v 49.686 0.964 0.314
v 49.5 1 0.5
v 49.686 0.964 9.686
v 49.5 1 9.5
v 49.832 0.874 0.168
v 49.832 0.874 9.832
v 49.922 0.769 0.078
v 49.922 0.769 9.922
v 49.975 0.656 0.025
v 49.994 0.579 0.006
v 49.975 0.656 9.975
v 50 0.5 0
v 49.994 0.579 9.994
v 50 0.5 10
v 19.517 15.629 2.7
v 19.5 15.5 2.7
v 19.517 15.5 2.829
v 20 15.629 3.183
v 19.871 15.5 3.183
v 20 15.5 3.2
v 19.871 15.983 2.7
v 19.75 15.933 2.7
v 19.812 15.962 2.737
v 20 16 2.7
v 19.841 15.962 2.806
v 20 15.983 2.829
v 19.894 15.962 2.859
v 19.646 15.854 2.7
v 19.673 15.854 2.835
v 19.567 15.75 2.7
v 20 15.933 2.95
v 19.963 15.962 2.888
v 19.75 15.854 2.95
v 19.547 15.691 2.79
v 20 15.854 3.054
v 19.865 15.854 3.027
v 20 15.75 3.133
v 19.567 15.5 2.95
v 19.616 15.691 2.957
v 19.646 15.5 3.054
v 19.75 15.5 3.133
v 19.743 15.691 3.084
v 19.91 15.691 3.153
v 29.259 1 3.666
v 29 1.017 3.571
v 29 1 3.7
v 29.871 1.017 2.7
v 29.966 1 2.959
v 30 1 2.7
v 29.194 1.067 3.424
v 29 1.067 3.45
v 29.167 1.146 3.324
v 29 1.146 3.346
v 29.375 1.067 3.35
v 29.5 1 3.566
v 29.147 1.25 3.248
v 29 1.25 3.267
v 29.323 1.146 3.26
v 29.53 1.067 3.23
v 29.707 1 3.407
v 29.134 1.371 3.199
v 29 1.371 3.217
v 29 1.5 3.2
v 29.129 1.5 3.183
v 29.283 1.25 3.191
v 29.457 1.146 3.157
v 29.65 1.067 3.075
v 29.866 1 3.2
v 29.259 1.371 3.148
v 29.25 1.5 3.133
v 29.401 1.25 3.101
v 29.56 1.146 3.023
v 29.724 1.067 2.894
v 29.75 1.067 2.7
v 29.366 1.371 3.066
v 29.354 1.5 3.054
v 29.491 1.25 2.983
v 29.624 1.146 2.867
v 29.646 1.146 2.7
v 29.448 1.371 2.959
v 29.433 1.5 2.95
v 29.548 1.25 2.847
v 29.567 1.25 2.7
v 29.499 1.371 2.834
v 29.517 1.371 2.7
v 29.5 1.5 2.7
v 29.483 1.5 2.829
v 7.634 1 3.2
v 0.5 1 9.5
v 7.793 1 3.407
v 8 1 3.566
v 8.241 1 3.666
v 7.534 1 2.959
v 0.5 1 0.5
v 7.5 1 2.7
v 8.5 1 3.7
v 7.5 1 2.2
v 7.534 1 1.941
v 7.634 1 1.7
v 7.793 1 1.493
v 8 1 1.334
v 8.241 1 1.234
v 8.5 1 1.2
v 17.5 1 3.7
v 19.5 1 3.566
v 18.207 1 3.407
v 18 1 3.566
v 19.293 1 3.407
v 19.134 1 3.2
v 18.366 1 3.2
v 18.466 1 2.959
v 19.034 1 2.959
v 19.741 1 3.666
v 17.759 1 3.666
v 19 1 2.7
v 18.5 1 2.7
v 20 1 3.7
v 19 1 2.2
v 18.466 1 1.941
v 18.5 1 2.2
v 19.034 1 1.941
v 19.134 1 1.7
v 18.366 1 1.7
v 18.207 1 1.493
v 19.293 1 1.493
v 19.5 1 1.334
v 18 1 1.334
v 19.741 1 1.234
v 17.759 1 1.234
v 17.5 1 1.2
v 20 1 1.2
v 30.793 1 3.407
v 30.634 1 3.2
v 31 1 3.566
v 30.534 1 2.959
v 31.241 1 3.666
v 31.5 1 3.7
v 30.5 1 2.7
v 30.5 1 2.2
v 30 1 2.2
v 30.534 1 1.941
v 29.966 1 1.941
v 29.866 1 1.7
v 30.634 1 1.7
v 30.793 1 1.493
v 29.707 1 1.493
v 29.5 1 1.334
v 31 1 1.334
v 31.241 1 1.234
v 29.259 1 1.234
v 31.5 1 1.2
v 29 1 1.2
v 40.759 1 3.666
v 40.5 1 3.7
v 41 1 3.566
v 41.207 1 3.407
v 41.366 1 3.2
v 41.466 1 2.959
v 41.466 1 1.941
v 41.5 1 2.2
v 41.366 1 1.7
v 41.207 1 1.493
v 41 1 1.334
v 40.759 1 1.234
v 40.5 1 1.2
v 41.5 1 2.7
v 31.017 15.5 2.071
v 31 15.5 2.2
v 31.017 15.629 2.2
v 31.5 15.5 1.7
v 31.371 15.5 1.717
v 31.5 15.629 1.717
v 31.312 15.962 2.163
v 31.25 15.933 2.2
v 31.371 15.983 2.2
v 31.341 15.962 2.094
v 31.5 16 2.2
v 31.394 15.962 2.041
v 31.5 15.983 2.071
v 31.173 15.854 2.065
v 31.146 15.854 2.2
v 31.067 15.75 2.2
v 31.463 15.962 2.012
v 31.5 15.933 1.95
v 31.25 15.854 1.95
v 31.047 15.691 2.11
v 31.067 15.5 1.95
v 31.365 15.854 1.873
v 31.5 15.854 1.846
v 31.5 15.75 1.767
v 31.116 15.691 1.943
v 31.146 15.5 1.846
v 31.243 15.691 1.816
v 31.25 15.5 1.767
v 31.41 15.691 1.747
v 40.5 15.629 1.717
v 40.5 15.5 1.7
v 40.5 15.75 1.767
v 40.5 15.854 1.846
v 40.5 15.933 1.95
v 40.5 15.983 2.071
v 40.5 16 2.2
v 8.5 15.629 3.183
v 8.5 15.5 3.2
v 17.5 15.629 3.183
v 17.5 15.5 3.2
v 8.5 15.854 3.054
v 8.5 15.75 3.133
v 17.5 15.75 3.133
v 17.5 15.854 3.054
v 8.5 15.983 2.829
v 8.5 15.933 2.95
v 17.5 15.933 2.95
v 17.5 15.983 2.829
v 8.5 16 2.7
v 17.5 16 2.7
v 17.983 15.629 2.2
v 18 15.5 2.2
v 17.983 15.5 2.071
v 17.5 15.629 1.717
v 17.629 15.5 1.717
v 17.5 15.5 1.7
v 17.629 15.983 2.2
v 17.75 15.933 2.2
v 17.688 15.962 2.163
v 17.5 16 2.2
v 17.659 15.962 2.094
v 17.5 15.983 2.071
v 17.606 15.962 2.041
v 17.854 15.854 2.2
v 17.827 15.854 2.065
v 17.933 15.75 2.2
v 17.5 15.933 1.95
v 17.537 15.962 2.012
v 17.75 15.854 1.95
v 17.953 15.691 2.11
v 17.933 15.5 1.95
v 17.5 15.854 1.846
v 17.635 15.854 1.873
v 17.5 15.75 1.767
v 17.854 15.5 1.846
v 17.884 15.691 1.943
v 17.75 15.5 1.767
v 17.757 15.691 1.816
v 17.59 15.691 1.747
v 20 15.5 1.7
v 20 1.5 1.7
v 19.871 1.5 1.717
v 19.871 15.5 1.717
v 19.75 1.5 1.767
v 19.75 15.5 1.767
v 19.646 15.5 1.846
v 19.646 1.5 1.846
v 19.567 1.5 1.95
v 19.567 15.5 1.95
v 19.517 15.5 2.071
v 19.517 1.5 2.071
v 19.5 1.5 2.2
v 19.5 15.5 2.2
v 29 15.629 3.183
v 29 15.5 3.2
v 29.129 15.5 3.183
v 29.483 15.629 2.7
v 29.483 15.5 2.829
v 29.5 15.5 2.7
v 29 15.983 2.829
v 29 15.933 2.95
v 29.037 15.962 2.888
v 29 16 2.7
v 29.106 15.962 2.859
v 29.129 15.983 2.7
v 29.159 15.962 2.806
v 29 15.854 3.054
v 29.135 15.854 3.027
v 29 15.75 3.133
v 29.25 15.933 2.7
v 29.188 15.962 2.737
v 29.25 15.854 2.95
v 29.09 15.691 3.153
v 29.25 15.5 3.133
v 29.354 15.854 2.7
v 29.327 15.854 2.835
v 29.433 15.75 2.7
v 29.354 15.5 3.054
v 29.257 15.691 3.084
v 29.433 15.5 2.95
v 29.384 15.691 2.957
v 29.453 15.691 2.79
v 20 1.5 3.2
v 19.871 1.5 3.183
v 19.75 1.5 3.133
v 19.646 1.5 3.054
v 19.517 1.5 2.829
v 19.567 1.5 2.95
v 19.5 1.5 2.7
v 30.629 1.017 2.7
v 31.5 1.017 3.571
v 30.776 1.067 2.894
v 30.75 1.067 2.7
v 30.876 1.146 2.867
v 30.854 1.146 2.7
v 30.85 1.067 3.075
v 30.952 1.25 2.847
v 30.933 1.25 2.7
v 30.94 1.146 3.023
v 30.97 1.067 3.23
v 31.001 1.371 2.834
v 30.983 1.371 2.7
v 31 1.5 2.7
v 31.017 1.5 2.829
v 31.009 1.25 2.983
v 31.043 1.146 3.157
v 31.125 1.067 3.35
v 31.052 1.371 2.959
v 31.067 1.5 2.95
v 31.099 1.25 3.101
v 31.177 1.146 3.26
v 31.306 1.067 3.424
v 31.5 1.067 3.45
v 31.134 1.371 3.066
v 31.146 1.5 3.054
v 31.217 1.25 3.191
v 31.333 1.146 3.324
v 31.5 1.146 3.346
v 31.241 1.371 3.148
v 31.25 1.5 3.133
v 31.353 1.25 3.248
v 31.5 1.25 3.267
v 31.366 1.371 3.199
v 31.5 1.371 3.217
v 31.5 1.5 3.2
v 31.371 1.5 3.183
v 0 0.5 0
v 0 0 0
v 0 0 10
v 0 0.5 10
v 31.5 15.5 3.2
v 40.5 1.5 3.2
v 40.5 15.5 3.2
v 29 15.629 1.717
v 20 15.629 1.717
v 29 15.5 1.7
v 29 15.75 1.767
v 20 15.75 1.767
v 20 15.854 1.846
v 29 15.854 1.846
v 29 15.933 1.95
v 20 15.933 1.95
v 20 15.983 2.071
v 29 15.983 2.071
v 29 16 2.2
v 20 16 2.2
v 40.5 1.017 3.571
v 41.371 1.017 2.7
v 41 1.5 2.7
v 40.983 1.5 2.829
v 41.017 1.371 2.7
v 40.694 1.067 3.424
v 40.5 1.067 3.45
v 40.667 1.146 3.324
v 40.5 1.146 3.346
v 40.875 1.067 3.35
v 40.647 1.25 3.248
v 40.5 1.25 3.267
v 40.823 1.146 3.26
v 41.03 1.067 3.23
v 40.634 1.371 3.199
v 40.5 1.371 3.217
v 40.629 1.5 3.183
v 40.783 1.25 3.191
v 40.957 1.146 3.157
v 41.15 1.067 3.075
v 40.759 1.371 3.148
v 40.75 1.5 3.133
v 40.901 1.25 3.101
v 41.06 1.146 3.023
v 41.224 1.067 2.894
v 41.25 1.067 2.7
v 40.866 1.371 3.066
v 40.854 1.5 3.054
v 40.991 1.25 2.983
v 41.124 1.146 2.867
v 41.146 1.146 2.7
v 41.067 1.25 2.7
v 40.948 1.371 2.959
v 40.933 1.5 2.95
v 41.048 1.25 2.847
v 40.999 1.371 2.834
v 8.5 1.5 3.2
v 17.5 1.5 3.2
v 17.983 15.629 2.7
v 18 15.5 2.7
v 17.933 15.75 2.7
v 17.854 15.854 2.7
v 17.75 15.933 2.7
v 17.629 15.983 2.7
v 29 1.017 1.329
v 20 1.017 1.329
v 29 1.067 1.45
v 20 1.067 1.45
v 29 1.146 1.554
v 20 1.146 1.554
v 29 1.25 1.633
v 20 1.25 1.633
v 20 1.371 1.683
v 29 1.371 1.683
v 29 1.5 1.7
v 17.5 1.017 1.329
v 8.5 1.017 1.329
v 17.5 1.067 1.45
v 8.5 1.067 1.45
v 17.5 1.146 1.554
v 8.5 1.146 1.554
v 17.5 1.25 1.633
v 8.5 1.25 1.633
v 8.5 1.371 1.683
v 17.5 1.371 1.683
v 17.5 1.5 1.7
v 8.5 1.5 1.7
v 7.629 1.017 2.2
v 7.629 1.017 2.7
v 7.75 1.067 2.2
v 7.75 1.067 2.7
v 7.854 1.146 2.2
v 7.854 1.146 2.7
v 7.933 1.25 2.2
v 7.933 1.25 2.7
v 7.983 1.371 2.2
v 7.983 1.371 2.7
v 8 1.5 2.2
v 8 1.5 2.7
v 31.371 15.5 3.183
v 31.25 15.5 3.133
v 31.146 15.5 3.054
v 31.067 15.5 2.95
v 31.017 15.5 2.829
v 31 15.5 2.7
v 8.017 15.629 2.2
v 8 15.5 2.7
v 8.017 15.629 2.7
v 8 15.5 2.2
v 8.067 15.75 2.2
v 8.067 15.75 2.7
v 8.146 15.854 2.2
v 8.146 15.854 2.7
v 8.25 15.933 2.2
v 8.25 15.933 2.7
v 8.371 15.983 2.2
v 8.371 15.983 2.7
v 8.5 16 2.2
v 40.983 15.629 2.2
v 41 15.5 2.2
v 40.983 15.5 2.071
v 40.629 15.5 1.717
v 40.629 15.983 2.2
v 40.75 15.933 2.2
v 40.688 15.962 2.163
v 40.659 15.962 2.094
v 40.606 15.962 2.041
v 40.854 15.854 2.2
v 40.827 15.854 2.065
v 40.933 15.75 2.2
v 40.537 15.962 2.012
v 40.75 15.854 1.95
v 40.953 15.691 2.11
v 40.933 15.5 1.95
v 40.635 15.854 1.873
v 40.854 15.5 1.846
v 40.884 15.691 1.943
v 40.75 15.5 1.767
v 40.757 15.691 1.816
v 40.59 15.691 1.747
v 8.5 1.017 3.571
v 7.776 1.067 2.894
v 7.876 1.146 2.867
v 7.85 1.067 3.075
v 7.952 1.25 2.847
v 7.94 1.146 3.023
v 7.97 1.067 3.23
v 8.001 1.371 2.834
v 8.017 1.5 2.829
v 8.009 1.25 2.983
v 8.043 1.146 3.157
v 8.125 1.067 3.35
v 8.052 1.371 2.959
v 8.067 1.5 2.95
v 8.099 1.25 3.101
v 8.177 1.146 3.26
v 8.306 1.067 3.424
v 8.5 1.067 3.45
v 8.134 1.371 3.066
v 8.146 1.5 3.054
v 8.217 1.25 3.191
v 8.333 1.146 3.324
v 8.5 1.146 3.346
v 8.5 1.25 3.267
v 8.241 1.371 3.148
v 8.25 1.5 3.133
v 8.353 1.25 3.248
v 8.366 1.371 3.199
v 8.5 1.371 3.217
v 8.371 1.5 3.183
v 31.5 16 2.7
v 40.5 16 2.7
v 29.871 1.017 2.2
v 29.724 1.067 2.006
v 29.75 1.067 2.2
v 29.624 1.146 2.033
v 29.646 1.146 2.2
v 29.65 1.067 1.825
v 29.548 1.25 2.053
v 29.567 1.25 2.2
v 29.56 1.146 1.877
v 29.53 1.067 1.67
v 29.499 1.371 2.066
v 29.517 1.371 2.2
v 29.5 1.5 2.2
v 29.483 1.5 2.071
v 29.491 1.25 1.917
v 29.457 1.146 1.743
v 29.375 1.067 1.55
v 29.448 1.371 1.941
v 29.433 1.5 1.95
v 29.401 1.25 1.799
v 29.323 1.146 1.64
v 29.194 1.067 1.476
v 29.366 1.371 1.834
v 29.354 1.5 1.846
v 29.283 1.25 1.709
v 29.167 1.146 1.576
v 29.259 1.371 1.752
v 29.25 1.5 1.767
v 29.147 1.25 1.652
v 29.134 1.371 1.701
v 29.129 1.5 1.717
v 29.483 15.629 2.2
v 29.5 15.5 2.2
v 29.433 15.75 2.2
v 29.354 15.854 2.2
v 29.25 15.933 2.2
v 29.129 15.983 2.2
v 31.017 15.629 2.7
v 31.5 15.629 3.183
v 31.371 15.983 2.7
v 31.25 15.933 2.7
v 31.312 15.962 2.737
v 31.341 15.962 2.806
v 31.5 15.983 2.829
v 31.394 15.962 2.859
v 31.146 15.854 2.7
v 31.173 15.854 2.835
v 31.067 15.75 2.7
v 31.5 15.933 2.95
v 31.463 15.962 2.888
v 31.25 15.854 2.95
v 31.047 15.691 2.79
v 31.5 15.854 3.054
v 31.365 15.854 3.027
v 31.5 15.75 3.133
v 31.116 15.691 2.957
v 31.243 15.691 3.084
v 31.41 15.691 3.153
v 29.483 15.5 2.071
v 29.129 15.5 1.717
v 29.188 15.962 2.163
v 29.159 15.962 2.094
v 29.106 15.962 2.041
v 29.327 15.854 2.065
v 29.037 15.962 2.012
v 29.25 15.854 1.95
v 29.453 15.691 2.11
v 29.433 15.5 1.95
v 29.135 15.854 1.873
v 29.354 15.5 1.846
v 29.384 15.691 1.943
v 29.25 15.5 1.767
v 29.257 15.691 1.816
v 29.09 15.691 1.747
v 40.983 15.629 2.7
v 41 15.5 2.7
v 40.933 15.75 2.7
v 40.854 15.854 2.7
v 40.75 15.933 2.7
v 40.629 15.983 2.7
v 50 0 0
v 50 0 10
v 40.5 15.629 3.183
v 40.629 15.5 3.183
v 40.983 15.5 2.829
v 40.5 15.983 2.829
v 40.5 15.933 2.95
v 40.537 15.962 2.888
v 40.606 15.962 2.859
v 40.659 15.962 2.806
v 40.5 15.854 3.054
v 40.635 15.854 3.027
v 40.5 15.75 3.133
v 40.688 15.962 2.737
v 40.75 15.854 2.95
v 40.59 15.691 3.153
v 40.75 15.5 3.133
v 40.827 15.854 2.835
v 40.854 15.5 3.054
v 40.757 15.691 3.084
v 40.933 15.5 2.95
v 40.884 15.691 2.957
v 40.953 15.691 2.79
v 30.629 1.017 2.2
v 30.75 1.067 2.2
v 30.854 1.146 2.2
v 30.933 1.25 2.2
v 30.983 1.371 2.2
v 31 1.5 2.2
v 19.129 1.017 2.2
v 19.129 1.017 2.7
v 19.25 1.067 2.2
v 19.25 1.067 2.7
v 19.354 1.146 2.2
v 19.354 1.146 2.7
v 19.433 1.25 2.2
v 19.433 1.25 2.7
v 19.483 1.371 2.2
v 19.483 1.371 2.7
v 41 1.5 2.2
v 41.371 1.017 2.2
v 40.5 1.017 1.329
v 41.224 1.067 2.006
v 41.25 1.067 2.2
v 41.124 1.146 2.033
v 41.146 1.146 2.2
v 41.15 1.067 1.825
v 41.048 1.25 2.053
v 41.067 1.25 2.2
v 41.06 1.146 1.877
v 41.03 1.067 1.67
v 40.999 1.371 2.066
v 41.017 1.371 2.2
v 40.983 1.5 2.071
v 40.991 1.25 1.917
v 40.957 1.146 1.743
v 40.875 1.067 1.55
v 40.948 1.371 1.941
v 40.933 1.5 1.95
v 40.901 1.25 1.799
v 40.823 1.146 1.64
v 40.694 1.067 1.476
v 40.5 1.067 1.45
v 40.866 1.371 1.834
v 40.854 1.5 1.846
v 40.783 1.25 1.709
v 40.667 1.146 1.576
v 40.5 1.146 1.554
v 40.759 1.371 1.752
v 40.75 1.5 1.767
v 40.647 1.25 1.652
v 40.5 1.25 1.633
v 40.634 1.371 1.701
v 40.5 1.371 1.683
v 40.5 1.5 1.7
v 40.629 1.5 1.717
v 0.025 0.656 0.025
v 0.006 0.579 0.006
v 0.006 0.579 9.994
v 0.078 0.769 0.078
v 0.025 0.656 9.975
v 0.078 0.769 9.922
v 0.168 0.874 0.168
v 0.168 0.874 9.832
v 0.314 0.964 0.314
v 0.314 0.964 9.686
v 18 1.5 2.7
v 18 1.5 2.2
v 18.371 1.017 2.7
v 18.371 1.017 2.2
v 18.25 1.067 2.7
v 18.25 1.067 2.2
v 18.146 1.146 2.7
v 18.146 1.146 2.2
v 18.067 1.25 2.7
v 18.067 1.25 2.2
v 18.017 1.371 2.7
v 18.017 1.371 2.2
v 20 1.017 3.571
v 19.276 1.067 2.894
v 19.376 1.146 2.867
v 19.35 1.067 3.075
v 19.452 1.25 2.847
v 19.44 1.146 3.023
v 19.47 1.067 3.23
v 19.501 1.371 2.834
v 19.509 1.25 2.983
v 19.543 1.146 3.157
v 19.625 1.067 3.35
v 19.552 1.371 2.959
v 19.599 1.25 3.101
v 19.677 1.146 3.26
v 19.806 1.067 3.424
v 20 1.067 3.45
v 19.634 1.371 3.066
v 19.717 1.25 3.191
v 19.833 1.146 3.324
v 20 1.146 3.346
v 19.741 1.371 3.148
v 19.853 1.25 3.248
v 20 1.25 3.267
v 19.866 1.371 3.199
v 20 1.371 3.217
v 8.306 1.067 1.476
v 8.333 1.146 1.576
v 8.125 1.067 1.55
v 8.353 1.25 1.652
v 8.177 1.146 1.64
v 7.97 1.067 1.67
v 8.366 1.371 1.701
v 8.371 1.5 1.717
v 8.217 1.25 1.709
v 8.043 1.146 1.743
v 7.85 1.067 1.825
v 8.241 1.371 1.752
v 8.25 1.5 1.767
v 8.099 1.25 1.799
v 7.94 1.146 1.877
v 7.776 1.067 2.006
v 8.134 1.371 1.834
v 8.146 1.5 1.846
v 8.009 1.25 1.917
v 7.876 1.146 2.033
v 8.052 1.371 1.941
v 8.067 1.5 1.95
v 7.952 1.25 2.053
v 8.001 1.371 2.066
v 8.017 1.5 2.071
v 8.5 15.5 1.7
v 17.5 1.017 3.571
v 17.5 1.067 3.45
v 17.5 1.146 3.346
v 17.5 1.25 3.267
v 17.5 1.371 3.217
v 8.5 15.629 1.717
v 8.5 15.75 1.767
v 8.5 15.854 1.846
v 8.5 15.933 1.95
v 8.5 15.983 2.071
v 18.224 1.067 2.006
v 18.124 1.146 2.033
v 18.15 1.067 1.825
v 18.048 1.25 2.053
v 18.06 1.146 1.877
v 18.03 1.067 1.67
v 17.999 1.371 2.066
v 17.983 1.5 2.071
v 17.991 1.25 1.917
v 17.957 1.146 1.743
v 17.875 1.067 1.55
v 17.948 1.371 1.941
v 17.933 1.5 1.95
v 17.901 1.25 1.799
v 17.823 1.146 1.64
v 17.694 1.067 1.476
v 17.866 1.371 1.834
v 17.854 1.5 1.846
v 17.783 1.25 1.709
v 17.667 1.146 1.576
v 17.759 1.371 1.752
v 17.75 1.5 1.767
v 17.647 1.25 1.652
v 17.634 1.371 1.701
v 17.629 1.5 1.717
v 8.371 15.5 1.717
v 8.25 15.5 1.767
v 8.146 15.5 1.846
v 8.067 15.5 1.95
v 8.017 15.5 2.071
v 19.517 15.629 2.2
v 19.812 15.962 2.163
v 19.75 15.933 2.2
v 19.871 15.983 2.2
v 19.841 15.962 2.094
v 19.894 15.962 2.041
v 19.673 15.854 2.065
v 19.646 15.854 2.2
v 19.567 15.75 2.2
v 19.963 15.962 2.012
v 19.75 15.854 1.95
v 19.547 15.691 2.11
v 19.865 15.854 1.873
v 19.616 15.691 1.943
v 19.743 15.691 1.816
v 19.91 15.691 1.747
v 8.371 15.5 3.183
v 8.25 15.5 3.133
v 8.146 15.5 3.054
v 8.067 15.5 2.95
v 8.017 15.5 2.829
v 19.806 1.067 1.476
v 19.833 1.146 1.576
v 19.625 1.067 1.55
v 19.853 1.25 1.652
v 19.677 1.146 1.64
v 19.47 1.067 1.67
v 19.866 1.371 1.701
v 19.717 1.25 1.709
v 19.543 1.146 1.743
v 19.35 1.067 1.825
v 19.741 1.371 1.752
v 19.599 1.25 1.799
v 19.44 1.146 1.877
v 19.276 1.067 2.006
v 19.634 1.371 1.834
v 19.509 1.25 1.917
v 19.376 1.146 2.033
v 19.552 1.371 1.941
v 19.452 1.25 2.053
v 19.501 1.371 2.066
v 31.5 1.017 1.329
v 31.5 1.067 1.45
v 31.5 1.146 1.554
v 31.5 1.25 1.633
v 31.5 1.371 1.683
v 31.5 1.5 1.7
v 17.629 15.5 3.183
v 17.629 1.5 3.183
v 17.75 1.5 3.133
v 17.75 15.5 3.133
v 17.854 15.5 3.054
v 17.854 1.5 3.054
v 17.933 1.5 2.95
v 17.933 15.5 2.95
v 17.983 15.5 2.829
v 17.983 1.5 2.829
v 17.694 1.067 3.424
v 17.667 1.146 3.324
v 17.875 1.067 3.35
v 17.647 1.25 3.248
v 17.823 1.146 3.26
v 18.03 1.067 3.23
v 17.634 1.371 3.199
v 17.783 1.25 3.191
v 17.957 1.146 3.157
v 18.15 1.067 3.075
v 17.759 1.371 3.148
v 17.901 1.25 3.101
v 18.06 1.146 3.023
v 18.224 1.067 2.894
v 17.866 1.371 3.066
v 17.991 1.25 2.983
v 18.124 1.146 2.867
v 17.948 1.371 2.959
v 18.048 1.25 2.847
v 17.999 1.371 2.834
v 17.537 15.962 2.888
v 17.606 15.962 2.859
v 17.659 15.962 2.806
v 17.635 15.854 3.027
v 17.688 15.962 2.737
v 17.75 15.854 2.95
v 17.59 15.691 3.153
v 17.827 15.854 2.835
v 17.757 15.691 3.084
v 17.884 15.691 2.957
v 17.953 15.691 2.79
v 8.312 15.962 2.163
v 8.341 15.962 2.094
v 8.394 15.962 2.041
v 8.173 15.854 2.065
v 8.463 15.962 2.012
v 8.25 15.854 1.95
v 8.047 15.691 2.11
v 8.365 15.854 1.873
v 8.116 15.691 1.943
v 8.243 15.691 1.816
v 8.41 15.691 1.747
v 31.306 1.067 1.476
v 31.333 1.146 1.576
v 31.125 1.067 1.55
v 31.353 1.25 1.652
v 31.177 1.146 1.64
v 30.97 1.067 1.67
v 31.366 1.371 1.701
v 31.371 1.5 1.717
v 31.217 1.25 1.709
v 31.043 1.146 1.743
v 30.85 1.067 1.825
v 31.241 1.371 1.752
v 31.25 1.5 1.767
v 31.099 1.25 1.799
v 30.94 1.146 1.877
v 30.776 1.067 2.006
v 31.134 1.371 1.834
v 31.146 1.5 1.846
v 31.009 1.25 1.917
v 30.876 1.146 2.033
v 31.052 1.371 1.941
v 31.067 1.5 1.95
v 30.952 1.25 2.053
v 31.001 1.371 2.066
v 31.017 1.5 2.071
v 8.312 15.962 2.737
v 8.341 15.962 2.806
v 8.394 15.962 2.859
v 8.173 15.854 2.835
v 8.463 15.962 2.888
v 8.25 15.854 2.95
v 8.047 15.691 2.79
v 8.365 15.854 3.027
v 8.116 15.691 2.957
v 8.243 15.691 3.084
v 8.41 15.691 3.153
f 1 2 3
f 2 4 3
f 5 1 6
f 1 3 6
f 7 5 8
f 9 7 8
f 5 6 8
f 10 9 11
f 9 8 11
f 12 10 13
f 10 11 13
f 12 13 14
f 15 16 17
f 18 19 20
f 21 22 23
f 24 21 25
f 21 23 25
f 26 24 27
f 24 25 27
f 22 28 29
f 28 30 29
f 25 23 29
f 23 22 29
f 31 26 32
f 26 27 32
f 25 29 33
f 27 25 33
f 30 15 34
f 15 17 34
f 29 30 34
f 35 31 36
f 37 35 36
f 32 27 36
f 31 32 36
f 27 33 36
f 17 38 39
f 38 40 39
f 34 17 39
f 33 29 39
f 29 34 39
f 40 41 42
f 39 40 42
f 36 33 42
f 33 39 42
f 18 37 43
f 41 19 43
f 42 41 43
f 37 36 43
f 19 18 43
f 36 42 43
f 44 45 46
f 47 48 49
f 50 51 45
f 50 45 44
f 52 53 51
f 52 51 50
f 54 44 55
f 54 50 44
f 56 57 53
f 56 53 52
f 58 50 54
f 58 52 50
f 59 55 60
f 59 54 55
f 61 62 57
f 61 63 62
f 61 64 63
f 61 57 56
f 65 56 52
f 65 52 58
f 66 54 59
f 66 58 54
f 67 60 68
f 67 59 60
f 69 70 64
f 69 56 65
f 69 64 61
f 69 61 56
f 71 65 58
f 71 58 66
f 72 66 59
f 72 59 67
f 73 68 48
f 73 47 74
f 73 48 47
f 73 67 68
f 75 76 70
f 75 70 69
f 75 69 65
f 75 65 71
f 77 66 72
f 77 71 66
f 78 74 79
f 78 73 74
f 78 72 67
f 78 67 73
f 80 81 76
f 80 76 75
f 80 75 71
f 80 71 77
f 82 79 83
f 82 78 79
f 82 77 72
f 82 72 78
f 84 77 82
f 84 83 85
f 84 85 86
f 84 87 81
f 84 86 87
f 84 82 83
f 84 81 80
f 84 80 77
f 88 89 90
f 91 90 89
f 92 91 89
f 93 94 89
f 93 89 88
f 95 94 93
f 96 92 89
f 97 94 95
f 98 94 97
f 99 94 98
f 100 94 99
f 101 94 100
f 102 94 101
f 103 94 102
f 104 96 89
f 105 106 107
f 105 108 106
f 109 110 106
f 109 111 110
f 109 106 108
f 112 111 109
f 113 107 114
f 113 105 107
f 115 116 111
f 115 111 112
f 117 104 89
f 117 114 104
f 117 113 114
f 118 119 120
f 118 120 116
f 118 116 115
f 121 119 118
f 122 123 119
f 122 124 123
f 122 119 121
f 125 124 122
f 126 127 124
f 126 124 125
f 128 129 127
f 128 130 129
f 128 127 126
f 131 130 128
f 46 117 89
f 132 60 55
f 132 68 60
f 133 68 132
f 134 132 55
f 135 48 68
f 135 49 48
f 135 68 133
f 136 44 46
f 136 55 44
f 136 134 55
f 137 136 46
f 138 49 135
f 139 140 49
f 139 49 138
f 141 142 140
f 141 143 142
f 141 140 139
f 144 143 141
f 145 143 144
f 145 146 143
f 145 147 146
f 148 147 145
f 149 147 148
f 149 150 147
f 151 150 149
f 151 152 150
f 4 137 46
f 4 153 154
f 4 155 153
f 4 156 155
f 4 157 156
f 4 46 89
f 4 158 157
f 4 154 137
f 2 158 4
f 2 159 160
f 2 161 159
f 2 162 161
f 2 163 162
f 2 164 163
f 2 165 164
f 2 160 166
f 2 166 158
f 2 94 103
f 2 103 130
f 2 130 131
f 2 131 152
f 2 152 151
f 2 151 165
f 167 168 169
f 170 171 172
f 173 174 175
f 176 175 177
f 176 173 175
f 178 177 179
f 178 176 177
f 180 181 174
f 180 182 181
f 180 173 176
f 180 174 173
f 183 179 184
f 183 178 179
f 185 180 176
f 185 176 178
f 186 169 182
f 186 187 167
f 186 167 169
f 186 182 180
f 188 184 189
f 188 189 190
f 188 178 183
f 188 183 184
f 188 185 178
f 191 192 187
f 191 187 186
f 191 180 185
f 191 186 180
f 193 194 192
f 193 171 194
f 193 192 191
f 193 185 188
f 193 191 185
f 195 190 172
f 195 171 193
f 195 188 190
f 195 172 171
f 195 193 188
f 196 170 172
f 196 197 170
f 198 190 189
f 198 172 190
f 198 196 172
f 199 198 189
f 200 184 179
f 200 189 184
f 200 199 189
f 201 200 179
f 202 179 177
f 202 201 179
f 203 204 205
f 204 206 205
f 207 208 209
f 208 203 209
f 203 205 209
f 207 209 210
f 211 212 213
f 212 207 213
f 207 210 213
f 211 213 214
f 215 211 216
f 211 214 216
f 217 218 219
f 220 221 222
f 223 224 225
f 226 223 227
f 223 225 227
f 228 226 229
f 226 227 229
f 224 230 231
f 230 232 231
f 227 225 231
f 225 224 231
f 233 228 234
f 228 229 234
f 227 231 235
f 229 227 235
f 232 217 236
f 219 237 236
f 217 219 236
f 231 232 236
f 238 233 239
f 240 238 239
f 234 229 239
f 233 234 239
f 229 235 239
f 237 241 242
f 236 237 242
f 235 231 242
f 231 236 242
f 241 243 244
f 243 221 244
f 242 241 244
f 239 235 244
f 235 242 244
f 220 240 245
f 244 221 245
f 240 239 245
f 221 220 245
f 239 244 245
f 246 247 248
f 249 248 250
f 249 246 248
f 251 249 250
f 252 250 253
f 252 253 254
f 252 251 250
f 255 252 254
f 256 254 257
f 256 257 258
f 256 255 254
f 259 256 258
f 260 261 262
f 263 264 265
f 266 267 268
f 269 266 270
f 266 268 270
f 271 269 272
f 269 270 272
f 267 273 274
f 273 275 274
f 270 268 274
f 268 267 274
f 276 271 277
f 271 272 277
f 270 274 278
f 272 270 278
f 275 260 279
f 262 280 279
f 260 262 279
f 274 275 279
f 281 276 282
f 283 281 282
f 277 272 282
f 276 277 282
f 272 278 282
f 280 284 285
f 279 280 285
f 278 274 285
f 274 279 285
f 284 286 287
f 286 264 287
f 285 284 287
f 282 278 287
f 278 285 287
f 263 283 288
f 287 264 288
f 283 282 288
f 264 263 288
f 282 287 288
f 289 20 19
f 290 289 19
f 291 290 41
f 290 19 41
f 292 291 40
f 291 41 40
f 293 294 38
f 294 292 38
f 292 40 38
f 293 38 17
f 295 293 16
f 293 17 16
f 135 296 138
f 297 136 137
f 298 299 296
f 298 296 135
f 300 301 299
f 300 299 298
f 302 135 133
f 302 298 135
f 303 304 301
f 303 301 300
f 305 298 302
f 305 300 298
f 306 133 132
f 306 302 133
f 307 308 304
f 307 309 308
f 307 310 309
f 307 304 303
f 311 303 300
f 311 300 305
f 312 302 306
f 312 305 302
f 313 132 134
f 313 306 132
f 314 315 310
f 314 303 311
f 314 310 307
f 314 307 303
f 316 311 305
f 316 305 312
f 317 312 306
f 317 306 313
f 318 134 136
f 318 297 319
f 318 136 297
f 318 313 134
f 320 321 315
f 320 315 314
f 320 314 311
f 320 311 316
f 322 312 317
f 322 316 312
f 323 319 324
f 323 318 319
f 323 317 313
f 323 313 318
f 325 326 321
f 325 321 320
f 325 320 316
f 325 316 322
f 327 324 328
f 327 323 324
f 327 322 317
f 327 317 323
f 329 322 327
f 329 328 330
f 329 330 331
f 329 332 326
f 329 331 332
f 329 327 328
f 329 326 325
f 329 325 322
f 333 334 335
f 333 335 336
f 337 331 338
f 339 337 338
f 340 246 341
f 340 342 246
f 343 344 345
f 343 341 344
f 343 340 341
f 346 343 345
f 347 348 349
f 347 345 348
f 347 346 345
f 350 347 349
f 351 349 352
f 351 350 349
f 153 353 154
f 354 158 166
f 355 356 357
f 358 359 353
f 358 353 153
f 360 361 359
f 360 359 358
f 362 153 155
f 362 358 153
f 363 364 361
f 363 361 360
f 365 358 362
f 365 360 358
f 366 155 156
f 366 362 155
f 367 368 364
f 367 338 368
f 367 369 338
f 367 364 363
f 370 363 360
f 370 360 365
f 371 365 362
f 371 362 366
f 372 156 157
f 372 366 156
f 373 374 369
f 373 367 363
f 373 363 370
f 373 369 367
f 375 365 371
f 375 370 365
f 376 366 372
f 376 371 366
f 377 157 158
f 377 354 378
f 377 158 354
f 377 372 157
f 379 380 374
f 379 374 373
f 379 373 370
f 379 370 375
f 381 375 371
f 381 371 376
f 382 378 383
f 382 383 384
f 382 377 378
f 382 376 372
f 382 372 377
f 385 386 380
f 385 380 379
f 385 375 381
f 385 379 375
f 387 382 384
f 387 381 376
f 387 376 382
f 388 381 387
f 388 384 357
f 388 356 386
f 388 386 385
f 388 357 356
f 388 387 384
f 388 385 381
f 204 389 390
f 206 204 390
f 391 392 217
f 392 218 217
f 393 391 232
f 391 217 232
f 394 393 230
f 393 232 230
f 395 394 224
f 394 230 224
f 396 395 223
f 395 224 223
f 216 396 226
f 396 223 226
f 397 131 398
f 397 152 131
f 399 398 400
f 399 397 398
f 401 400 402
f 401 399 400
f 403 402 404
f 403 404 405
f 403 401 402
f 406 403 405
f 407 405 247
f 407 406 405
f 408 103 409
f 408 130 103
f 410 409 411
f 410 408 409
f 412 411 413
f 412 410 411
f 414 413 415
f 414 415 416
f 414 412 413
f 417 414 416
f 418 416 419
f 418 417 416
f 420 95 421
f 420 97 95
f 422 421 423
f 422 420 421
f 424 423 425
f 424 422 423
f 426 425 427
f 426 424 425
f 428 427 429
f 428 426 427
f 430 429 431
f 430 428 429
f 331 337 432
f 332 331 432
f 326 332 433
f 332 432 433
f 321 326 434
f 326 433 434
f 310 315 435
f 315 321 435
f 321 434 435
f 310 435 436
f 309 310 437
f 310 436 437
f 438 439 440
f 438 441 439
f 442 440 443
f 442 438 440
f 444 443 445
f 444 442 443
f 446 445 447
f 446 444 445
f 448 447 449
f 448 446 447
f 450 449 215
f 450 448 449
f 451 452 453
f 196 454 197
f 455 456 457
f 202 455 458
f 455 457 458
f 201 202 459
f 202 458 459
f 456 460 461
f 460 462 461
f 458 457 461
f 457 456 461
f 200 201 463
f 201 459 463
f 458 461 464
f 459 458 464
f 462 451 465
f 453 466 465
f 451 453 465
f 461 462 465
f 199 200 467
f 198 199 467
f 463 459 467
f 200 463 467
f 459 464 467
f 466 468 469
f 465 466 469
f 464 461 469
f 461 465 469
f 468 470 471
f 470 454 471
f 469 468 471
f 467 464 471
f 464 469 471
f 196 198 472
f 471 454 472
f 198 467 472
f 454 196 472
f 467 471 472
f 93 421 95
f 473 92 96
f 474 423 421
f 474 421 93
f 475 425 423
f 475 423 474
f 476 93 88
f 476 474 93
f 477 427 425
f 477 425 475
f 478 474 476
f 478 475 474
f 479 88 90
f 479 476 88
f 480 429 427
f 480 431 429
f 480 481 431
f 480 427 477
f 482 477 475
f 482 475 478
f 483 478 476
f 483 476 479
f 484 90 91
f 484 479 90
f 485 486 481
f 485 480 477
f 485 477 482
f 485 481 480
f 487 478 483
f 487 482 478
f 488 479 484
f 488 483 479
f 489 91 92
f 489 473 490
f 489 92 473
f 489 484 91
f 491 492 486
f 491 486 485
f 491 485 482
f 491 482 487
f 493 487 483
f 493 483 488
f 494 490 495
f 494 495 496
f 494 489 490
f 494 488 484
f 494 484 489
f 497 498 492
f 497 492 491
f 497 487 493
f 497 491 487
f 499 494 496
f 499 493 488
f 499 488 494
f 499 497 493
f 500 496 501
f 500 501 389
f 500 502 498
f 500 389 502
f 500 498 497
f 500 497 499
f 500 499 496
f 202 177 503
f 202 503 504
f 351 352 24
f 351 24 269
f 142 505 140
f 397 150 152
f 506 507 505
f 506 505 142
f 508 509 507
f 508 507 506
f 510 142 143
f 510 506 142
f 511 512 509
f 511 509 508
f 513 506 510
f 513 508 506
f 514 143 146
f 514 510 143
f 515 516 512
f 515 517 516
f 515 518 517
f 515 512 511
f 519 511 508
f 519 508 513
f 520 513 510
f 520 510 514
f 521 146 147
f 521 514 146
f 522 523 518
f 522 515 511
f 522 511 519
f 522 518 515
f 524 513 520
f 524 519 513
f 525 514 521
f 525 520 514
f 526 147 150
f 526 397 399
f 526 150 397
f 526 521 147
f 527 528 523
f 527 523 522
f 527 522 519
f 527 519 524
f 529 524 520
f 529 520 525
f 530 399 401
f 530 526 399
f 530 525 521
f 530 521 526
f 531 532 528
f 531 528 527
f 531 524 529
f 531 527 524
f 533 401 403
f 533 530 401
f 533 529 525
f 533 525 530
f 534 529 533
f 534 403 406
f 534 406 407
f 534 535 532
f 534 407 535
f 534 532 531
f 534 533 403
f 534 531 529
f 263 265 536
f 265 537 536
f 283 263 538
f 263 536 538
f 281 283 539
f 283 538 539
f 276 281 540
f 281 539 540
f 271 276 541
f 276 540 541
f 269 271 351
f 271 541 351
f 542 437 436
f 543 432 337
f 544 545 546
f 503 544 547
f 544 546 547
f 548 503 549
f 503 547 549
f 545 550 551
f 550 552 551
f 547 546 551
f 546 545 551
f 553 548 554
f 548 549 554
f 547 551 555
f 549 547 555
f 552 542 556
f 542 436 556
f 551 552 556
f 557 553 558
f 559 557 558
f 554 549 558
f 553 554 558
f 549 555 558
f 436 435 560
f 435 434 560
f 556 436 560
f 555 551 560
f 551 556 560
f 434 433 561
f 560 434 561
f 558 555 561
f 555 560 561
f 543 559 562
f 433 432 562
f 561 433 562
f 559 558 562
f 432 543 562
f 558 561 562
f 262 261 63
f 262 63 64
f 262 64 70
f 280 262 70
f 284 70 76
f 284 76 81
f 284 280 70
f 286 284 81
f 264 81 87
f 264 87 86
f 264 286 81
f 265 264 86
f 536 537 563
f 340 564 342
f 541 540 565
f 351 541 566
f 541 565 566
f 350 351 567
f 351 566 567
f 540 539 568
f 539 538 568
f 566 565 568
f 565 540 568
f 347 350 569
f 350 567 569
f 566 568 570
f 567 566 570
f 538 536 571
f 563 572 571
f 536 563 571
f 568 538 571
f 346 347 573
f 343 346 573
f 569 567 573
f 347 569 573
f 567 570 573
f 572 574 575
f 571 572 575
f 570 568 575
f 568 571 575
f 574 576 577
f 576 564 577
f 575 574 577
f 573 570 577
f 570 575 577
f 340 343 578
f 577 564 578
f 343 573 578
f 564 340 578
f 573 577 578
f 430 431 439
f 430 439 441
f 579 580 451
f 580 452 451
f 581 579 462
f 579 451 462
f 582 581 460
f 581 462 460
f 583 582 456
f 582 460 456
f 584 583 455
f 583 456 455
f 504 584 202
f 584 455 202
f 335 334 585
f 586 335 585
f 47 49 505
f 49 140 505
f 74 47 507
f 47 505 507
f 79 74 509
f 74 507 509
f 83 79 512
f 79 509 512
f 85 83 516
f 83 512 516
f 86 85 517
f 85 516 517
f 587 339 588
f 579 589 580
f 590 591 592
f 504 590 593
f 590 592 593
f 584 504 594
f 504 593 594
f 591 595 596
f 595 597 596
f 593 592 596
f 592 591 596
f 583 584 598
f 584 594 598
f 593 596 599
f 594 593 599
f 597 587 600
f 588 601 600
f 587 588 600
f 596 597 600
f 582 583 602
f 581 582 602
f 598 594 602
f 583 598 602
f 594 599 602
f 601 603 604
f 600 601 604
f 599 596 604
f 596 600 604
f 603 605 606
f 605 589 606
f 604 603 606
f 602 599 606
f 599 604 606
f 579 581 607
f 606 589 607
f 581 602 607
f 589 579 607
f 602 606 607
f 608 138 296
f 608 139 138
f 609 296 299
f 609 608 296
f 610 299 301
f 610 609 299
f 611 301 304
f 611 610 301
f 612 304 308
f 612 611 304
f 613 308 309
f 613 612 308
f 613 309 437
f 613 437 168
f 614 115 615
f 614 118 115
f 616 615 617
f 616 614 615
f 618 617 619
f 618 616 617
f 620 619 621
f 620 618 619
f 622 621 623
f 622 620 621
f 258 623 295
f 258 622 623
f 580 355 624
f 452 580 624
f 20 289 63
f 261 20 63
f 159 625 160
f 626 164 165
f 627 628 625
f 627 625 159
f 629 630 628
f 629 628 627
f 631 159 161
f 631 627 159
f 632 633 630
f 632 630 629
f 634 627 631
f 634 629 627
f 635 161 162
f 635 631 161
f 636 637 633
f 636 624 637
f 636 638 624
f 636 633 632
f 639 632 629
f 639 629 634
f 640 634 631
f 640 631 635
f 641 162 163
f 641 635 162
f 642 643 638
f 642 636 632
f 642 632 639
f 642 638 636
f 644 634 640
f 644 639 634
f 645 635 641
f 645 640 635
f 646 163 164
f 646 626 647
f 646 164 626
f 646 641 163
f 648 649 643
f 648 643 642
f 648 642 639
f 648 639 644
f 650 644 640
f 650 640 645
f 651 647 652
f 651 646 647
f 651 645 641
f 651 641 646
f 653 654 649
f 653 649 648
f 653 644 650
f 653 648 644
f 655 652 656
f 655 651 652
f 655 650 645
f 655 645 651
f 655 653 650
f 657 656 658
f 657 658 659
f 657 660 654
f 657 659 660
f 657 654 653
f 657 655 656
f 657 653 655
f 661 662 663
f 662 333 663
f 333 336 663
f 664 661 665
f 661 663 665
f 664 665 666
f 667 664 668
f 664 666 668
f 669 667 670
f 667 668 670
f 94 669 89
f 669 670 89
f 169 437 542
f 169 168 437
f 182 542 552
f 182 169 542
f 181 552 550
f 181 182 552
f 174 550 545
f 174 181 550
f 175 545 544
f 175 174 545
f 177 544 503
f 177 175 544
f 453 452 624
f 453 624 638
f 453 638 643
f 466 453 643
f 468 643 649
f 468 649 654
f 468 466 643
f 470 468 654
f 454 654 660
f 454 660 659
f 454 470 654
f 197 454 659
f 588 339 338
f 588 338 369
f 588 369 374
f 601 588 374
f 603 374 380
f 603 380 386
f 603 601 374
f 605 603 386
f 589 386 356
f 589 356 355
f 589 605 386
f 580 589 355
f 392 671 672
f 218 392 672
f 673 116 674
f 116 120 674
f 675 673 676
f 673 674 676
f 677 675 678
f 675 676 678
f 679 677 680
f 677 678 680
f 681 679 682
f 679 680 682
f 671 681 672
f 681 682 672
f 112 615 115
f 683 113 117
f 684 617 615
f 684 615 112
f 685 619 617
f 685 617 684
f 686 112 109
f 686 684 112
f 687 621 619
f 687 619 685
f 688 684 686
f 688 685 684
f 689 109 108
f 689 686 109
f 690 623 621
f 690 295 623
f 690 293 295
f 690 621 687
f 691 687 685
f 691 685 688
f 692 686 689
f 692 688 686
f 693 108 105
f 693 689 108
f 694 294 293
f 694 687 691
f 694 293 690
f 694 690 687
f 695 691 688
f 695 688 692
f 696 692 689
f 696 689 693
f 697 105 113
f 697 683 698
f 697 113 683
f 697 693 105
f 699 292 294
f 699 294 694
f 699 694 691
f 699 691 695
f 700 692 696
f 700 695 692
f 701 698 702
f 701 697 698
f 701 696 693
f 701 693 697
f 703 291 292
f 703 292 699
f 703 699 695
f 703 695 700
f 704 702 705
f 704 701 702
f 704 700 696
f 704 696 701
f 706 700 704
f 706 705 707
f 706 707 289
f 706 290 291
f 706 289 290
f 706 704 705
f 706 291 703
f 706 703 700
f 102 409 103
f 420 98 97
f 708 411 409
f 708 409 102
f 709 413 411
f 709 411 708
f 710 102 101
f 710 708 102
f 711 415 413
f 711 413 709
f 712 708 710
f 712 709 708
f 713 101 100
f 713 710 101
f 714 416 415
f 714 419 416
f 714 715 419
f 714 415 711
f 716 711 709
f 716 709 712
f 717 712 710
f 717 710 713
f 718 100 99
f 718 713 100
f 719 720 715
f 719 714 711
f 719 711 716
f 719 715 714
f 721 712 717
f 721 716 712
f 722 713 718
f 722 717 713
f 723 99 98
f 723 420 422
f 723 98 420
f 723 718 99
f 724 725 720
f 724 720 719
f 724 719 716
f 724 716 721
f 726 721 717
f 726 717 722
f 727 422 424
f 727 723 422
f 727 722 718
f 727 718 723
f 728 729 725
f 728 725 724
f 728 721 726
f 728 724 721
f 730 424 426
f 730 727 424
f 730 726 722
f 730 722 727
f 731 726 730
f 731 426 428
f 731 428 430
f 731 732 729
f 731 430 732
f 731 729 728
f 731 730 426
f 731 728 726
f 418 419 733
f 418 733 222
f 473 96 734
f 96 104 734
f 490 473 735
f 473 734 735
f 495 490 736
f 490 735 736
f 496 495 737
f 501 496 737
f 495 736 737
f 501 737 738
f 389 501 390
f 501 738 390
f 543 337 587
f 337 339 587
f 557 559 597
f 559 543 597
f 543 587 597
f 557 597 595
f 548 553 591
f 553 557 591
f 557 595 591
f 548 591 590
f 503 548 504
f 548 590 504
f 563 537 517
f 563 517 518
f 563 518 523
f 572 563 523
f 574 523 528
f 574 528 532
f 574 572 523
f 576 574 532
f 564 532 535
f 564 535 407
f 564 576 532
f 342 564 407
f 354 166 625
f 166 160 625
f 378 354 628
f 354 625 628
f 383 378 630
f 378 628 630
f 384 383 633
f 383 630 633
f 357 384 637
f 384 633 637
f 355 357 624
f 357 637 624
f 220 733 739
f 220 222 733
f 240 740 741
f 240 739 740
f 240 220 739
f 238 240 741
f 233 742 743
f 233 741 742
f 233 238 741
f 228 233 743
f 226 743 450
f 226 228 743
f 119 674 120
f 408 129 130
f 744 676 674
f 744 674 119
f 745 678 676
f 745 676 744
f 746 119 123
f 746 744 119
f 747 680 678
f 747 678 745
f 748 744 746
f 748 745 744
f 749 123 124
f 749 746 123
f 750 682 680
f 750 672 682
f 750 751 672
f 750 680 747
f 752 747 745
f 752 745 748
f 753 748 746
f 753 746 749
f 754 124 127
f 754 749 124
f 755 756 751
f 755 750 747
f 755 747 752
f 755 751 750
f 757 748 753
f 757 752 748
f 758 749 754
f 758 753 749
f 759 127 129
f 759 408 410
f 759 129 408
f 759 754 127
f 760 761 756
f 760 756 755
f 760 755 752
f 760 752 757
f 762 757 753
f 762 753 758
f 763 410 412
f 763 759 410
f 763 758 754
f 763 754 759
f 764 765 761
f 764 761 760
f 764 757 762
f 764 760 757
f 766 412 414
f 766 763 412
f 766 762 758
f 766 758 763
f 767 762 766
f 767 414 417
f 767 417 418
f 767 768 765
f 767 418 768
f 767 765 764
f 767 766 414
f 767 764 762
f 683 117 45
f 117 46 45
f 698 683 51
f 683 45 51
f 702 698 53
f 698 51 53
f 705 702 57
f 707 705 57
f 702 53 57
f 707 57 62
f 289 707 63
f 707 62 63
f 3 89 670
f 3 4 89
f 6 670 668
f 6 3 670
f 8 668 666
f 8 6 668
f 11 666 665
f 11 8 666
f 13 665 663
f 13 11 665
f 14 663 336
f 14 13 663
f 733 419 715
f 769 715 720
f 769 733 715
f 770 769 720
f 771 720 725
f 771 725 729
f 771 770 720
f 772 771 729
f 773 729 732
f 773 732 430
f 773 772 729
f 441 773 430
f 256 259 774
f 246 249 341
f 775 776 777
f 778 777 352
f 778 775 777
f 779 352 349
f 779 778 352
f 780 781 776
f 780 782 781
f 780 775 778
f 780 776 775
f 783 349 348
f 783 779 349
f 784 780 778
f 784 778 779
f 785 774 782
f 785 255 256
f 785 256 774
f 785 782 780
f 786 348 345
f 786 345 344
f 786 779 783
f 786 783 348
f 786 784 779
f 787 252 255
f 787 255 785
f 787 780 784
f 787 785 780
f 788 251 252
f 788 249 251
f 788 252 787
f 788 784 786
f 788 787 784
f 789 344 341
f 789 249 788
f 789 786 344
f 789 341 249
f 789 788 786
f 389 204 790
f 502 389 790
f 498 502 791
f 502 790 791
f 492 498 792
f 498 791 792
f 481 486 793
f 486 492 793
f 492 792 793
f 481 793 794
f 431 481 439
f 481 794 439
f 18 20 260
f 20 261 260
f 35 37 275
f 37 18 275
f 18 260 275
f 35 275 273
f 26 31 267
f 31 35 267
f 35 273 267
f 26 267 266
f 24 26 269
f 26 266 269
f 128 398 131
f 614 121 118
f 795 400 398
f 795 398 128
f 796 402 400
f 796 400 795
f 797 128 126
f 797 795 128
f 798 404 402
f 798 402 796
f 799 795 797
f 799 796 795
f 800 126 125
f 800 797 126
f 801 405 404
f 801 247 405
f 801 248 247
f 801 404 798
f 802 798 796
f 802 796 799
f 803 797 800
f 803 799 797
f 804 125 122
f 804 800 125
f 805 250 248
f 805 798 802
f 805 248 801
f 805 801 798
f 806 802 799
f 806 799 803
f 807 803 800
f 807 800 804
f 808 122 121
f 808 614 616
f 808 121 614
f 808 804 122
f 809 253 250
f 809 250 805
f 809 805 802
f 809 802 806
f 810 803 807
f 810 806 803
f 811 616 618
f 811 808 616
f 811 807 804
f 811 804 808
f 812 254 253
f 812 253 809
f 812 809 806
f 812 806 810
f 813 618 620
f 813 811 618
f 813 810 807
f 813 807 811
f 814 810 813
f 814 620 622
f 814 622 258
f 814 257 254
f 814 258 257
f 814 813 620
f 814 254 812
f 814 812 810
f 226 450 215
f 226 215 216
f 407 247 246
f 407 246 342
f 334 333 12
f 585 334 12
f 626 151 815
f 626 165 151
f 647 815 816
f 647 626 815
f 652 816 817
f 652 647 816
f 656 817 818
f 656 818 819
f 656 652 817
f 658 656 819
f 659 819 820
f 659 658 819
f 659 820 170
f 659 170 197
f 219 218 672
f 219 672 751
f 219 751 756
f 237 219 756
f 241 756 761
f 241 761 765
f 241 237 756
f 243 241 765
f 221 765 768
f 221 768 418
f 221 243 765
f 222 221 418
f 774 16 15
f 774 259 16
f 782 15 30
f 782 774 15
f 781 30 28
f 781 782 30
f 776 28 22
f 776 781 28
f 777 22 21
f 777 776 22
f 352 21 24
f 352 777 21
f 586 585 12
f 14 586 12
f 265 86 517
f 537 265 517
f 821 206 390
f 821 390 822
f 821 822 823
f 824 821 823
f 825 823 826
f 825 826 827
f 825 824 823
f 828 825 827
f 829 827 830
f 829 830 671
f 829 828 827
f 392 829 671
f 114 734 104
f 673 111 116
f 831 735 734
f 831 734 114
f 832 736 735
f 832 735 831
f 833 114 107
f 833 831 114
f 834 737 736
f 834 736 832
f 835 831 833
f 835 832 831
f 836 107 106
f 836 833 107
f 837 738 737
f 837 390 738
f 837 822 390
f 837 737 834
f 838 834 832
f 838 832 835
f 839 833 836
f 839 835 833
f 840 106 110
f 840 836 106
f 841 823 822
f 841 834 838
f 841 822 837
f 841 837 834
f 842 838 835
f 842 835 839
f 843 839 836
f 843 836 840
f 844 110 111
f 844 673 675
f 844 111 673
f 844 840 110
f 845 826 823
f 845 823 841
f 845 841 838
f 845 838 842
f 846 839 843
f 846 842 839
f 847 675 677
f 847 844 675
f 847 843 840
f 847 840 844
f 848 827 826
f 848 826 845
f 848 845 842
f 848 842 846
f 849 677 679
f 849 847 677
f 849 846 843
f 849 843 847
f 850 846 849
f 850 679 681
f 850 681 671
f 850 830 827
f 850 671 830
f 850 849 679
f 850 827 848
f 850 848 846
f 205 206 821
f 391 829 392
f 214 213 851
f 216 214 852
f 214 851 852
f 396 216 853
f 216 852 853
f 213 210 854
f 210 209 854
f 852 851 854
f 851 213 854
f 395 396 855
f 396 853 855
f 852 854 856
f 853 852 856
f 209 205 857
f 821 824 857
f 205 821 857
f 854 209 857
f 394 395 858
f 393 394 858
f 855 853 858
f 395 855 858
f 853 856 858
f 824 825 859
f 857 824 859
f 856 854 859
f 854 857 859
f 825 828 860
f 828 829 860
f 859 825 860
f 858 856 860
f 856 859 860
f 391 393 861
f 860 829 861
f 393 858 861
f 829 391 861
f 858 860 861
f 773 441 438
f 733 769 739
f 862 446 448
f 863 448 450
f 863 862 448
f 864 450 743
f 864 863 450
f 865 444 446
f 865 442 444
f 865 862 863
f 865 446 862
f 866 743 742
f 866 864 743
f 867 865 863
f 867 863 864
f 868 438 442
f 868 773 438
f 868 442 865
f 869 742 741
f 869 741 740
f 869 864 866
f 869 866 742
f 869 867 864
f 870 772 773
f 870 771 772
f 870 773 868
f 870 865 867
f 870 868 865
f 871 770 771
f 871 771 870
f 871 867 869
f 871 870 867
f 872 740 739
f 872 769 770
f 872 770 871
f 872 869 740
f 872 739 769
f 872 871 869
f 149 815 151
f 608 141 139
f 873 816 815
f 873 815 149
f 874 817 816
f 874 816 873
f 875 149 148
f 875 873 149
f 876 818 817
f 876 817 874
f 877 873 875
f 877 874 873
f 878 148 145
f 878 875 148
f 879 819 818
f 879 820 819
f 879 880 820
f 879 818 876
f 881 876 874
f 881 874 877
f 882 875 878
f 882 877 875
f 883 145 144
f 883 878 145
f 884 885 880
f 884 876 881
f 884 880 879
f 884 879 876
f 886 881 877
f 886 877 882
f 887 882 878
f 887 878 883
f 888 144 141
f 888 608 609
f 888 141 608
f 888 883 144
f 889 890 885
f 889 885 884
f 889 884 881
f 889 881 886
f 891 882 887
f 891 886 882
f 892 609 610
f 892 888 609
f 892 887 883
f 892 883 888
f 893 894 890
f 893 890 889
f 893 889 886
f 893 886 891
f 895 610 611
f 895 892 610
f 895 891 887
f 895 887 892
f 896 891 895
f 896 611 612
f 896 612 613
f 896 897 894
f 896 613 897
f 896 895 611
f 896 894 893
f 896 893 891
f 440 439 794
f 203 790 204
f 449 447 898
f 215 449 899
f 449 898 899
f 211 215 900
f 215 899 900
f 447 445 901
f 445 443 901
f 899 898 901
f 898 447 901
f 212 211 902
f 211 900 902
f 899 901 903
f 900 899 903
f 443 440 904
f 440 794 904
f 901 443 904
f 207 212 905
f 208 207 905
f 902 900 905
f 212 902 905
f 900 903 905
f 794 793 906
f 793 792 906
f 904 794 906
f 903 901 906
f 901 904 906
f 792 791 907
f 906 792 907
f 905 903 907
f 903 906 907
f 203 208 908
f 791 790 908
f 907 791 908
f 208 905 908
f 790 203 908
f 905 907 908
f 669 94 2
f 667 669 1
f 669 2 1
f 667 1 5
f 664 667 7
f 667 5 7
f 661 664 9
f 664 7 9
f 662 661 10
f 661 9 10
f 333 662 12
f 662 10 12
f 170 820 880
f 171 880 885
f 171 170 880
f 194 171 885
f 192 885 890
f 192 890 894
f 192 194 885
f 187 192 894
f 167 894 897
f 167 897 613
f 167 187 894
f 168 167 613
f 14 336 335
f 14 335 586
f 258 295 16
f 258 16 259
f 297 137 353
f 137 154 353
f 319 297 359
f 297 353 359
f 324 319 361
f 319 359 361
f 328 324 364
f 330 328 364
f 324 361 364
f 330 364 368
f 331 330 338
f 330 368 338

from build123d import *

# Parameters (mm, degrees)
SKETCH_1_W      = 50
SKETCH_1_H      = 1
EXTRUDE_1_DEPTH = 10
SKETCH_2_W      = 10
SKETCH_2_H      = 1.5
EXTRUDE_2_DEPTH = 15
FILLET_3_R      = 0.5


with BuildPart() as part:
    # 草图1 → 凸台-拉伸1 (new body)
    with BuildSketch(Plane.XY):
        with Locations((25, 0.5)):
            Rectangle(SKETCH_1_W, SKETCH_1_H)
    extrude(amount=EXTRUDE_1_DEPTH)

    # 草图2 → 凸台-拉伸2 (add)
    with BuildSketch(Plane(origin=(0, 1, 0), x_dir=(1, 0, 0), z_dir=(0, 1, 0))):
        with Locations((13, -2.45)):
            Rectangle(SKETCH_2_W, SKETCH_2_H)
        with Locations((24.5, -2.45)):
            Rectangle(SKETCH_2_W, SKETCH_2_H)
        with Locations((36, -2.45)):
            Rectangle(SKETCH_2_W, SKETCH_2_H)
    extrude(amount=EXTRUDE_2_DEPTH)

    # 圆角3
    fillet_3_edges = [part.edges().sort_by_distance(p)[0] for p in [
        (25, 1, 10),
        (8, 1, 2.45),
        (8, 8.5, 1.7),
        (13, 1, 3.2),
        (8, 8.5, 3.2),
        (18, 1, 2.45),
        (18, 8.5, 3.2),
        (13, 1, 1.7),
        (18, 8.5, 1.7),
        (8, 16, 2.45),
        (13, 16, 3.2),
        (18, 16, 2.45),
        (13, 16, 1.7),
        (19.5, 1, 2.45),
        (19.5, 8.5, 1.7),
        (24.5, 1, 3.2),
        (19.5, 8.5, 3.2),
        (29.5, 1, 2.45),
        (29.5, 8.5, 3.2),
        (24.5, 1, 1.7),
        (29.5, 8.5, 1.7),
        (19.5, 16, 2.45),
        (24.5, 16, 3.2),
        (29.5, 16, 2.45),
        (24.5, 16, 1.7),
        (31, 1, 2.45),
        (31, 8.5, 1.7),
        (36, 1, 3.2),
        (31, 8.5, 3.2),
        (41, 1, 2.45),
        (41, 8.5, 3.2),
        (36, 1, 1.7),
        (41, 8.5, 1.7),
        (31, 16, 2.45),
        (36, 16, 3.2),
        (41, 16, 2.45),
        (36, 16, 1.7),
        (25, 1, 0),
        (0, 1, 5),
        (50, 1, 5),
    ]]
    fillet(fillet_3_edges, radius=FILLET_3_R)


solid = part.part
